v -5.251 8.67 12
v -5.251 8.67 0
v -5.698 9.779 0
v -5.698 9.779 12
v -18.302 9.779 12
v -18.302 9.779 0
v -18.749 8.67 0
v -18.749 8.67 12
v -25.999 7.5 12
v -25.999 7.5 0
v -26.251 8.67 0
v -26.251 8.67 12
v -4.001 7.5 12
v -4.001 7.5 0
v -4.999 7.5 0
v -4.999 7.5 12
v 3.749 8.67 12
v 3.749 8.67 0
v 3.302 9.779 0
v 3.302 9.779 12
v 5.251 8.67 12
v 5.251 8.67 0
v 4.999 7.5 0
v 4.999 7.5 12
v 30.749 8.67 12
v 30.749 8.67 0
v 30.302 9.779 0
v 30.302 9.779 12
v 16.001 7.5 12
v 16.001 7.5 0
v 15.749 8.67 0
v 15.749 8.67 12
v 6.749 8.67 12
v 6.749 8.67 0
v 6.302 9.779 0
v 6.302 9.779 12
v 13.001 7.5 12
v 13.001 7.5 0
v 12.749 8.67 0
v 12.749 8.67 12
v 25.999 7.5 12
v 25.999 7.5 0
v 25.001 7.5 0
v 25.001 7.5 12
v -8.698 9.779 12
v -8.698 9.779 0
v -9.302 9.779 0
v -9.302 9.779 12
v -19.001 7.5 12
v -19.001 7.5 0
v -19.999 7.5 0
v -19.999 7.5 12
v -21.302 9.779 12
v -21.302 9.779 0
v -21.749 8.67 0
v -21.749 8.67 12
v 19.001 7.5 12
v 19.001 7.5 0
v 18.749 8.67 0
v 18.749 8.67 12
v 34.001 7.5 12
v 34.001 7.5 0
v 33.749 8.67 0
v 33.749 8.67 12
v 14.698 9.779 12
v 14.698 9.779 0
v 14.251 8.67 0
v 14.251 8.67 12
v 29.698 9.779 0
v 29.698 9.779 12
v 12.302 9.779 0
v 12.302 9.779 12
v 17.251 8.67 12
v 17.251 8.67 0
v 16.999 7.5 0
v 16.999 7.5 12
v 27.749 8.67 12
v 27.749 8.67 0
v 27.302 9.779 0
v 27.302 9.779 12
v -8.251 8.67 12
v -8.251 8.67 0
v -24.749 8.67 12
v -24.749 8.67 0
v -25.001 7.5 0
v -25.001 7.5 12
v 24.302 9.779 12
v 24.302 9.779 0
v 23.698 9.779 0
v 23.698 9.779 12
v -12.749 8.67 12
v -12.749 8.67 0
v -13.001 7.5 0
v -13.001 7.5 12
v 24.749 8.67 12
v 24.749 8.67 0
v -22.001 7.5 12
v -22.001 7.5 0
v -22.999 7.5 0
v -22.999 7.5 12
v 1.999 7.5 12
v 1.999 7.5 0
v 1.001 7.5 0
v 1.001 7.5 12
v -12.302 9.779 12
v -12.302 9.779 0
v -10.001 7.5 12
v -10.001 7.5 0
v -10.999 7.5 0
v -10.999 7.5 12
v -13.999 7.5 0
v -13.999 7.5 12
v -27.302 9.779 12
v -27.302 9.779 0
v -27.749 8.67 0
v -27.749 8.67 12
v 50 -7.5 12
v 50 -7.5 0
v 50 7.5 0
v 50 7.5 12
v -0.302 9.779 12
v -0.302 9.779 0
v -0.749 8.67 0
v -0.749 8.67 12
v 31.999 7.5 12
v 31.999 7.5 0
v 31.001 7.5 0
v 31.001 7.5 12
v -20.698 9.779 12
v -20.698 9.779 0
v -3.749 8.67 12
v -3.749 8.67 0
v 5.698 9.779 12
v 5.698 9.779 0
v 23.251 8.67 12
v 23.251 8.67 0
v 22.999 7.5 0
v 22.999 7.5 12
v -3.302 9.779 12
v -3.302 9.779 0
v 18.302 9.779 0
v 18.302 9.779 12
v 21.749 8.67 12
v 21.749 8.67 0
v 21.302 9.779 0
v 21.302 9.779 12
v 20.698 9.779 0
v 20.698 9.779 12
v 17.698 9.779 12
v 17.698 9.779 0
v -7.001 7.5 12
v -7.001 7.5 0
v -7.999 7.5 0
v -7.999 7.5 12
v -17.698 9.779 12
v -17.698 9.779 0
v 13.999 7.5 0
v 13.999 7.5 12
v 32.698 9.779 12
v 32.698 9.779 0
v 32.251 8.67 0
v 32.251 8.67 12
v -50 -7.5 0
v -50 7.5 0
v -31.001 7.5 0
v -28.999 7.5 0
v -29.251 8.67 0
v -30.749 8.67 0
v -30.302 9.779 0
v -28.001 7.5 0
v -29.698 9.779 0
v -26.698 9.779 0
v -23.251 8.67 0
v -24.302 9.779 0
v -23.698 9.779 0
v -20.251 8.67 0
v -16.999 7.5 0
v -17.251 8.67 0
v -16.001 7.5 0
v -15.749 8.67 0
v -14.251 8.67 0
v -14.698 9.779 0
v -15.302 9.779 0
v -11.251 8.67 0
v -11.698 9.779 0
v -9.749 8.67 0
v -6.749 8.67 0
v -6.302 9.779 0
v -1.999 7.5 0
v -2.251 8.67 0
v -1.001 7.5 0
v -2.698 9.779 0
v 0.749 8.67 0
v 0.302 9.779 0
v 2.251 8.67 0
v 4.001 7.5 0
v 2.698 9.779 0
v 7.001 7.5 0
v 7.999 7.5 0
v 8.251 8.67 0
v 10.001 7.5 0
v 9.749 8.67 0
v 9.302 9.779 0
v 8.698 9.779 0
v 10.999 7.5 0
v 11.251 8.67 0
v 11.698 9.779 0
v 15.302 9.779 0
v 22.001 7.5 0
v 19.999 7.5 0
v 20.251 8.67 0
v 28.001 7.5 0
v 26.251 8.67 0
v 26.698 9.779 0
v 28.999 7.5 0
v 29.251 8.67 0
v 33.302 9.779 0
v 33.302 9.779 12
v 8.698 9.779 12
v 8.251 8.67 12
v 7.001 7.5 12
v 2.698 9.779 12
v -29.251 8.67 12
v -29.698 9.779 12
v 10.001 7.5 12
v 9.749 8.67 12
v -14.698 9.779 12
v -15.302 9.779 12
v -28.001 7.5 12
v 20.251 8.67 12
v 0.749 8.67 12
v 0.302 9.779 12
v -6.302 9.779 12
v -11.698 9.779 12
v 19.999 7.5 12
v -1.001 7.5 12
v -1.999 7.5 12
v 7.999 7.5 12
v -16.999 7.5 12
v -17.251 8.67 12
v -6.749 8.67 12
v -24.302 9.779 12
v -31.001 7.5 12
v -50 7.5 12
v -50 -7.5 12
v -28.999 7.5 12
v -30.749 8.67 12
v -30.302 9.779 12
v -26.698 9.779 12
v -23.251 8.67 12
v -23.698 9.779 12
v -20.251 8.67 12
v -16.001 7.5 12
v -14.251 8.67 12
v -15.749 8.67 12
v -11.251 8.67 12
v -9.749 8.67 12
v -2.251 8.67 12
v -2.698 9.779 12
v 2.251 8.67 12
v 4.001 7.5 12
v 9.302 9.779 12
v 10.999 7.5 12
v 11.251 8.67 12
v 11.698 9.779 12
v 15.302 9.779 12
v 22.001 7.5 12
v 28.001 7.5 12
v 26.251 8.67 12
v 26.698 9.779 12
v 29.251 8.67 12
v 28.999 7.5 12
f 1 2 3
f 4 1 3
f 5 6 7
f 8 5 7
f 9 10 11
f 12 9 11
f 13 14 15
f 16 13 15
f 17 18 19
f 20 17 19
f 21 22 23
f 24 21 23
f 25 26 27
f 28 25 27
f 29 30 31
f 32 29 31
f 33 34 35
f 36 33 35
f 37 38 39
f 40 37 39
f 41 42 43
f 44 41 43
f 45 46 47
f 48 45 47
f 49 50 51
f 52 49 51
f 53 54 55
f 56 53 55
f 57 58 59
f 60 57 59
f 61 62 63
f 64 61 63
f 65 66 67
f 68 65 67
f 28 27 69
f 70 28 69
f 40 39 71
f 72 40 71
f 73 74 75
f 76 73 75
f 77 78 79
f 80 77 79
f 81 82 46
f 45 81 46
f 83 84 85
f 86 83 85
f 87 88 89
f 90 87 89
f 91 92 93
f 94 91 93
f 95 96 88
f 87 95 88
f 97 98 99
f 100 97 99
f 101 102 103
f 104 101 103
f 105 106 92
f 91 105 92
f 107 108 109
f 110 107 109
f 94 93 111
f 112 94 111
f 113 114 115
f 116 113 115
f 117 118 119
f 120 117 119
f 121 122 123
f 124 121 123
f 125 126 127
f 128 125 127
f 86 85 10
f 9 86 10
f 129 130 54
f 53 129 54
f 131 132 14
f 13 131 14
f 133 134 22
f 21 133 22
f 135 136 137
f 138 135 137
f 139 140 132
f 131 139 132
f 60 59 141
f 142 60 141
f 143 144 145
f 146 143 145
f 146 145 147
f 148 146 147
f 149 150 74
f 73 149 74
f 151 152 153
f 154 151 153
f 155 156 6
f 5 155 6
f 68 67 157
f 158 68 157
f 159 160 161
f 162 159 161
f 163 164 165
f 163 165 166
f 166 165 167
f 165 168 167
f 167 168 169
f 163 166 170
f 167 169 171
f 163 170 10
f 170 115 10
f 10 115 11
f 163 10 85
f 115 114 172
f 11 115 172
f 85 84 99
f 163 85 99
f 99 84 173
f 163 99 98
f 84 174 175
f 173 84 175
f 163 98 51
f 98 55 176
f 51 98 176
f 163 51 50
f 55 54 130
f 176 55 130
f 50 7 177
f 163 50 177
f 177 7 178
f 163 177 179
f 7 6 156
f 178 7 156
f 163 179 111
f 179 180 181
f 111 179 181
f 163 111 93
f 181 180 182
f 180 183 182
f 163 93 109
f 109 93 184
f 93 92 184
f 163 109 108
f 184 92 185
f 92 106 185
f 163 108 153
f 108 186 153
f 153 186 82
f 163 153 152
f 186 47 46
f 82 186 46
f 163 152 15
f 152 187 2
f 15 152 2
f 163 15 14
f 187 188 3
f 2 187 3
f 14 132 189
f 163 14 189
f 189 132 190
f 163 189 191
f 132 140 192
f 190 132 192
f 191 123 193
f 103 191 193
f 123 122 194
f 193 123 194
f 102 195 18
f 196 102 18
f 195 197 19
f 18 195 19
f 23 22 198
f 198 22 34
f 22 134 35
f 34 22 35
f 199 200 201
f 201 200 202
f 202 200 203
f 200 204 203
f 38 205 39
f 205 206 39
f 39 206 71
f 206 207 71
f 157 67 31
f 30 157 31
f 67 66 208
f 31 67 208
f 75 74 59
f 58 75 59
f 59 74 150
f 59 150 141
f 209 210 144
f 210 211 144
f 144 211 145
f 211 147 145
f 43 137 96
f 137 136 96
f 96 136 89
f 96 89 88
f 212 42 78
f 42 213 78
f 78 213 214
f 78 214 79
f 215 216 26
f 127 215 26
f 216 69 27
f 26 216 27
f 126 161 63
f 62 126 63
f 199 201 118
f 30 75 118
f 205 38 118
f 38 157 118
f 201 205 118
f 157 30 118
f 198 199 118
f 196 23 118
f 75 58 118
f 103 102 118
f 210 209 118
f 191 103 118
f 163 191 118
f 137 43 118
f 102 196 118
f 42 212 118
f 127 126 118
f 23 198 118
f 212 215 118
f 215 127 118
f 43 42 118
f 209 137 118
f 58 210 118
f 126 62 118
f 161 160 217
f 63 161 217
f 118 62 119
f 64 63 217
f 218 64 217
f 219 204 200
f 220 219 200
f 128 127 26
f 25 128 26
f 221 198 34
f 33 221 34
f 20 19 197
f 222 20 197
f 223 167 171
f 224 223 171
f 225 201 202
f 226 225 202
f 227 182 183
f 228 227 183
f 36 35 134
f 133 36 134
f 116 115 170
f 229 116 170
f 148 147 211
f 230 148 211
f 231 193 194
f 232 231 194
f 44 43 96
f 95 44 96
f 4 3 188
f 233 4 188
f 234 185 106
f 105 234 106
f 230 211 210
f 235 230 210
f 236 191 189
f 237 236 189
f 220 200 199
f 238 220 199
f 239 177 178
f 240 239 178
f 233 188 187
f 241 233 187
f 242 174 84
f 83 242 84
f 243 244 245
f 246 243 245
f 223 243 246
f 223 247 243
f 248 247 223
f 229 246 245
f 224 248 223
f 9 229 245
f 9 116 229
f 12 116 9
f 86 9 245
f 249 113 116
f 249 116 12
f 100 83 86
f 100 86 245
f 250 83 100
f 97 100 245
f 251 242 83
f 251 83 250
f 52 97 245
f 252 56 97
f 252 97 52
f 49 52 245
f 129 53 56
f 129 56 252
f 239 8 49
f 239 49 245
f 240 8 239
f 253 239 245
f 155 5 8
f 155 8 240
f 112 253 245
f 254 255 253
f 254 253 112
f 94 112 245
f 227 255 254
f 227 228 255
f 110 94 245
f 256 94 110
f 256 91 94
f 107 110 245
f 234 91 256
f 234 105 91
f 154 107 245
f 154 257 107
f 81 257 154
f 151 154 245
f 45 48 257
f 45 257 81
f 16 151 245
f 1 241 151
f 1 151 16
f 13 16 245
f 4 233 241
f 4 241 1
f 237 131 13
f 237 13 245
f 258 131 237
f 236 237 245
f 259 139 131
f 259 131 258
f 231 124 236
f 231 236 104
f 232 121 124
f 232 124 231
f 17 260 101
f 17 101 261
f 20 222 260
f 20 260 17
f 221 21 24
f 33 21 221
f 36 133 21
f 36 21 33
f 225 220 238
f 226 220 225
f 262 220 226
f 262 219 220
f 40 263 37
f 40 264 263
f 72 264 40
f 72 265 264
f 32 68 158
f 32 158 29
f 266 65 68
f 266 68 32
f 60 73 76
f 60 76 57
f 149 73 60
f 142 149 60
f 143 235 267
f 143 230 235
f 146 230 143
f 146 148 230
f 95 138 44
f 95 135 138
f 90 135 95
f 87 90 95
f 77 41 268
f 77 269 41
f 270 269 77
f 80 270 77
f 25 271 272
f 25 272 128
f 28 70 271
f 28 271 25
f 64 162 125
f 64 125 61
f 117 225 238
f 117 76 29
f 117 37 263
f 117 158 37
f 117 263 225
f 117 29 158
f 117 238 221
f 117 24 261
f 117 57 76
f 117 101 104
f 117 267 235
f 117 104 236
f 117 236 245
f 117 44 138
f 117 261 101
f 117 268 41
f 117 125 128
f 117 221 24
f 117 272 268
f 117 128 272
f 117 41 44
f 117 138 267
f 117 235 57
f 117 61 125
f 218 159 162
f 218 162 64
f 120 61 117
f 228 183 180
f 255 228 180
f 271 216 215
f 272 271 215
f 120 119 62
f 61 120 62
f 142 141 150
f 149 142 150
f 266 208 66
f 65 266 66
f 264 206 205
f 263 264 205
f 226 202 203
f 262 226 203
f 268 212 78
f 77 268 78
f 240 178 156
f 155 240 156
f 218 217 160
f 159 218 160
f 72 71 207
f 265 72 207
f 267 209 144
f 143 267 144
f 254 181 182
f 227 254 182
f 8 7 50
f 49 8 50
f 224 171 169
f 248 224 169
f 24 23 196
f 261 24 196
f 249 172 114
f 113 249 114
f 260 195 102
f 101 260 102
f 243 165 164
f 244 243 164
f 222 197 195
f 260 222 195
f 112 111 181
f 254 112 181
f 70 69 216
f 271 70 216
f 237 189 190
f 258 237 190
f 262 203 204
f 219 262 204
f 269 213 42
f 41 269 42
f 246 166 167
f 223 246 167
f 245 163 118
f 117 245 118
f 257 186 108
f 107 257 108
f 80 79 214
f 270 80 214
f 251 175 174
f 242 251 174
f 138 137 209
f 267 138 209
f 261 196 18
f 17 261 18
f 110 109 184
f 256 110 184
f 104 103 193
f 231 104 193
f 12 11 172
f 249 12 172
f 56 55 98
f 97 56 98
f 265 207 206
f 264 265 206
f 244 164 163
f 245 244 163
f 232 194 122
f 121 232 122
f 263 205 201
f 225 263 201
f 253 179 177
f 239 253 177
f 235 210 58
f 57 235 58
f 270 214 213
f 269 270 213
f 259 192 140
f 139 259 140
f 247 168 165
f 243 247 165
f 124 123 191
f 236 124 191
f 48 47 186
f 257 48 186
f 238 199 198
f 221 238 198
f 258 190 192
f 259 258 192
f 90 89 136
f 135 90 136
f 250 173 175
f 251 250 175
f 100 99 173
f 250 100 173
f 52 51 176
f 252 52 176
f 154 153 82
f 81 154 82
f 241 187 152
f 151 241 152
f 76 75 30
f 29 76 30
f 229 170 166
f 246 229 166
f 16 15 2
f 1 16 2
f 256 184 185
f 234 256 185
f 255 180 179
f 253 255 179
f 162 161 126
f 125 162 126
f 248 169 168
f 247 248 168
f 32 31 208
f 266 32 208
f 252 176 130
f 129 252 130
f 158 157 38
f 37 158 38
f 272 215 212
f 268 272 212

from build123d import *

# Parameters (mm, degrees)
BOSS_EXTRUDE1_DEPTH = 12


with BuildPart() as part:
    # Sketch1 → Boss-Extrude1 (new body)
    with BuildSketch(Plane.XY):
        Polygon((1.001450614, 7.5), (0.749315442, 8.669732015), (0.301638962, 9.779430578), (-0.301638962, 9.779430578), (-0.749315442, 8.669732015), (-1.001450614, 7.5), (-1.998549386, 7.5), (-2.250684558, 8.669732015), (-2.698361038, 9.779430578), (-3.301638962, 9.779430578), (-3.749315442, 8.669732015), (-4.001450614, 7.5), (-4.998549386, 7.5), (-5.250684558, 8.669732015), (-5.698361038, 9.779430578), (-6.301638962, 9.779430578), (-6.749315442, 8.669732015), (-7.001450614, 7.5), (-7.998549386, 7.5), (-8.250684558, 8.669732015), (-8.698361038, 9.779430578), (-9.301638962, 9.779430578), (-9.749315442, 8.669732015), (-10.001450614, 7.5), (-10.998549386, 7.5), (-11.250684558, 8.669732015), (-11.698361038, 9.779430578), (-12.301638962, 9.779430578), (-12.749315442, 8.669732015), (-13.001450614, 7.5), (-13.998549386, 7.5), (-14.250684558, 8.669732015), (-14.698361038, 9.779430578), (-15.301638962, 9.779430578), (-15.749315442, 8.669732015), (-16.001450614, 7.5), (-16.998549386, 7.5), (-17.250684558, 8.669732015), (-17.698361038, 9.779430578), (-18.301638962, 9.779430578), (-18.749315442, 8.669732015), (-19.001450614, 7.5), (-19.998549386, 7.5), (-20.250684558, 8.669732015), (-20.698361038, 9.779430578), (-21.301638962, 9.779430578), (-21.749315442, 8.669732015), (-22.001450614, 7.5), (-22.998549386, 7.5), (-23.250684558, 8.669732015), (-23.698361038, 9.779430578), (-24.301638962, 9.779430578), (-24.749315442, 8.669732015), (-25.001450614, 7.5), (-25.998549386, 7.5), (-26.250684558, 8.669732015), (-26.698361038, 9.779430578), (-27.301638962, 9.779430578), (-27.749315442, 8.669732015), (-28.001450614, 7.5), (-28.998549386, 7.5), (-29.250684558, 8.669732015), (-29.698361038, 9.779430578), (-30.301638962, 9.779430578), (-30.749315442, 8.669732015), (-31.001450614, 7.5), (-50, 7.5), (-50, -7.5), (50, -7.5), (50, 7.5), (34.001450614, 7.5), (33.749315442, 8.669732015), (33.301638962, 9.779430578), (32.698361038, 9.779430578), (32.250684558, 8.669732015), (31.998549386, 7.5), (31.001450614, 7.5), (30.749315442, 8.669732015), (30.301638962, 9.779430578), (29.698361038, 9.779430578), (29.250684558, 8.669732015), (28.998549386, 7.5), (28.001450614, 7.5), (27.749315442, 8.669732015), (27.301638962, 9.779430578), (26.698361038, 9.779430578), (26.250684558, 8.669732015), (25.998549386, 7.5), (25.001450614, 7.5), (24.749315442, 8.669732015), (24.301638962, 9.779430578), (23.698361038, 9.779430578), (23.250684558, 8.669732015), (22.998549386, 7.5), (22.001450614, 7.5), (21.749315442, 8.669732015), (21.301638962, 9.779430578), (20.698361038, 9.779430578), (20.250684558, 8.669732015), (19.998549386, 7.5), (19.001450614, 7.5), (18.749315442, 8.669732015), (18.301638962, 9.779430578), (17.698361038, 9.779430578), (17.250684558, 8.669732015), (16.998549386, 7.5), (16.001450614, 7.5), (15.749315442, 8.669732015), (15.301638962, 9.779430578), (14.698361038, 9.779430578), (14.250684558, 8.669732015), (13.998549386, 7.5), (13.001450614, 7.5), (12.749315442, 8.669732015), (12.301638962, 9.779430578), (11.698361038, 9.779430578), (11.250684558, 8.669732015), (10.998549386, 7.5), (10.001450614, 7.5), (9.749315442, 8.669732015), (9.301638962, 9.779430578), (8.698361038, 9.779430578), (8.250684558, 8.669732015), (7.998549386, 7.5), (7.001450614, 7.5), (6.749315442, 8.669732015), (6.301638962, 9.779430578), (5.698361038, 9.779430578), (5.250684558, 8.669732015), (4.998549386, 7.5), (4.001450614, 7.5), (3.749315442, 8.669732015), (3.301638962, 9.779430578), (2.698361038, 9.779430578), (2.250684558, 8.669732015), (1.998549386, 7.5), align=None)
    extrude(amount=BOSS_EXTRUDE1_DEPTH)


solid = part.part
